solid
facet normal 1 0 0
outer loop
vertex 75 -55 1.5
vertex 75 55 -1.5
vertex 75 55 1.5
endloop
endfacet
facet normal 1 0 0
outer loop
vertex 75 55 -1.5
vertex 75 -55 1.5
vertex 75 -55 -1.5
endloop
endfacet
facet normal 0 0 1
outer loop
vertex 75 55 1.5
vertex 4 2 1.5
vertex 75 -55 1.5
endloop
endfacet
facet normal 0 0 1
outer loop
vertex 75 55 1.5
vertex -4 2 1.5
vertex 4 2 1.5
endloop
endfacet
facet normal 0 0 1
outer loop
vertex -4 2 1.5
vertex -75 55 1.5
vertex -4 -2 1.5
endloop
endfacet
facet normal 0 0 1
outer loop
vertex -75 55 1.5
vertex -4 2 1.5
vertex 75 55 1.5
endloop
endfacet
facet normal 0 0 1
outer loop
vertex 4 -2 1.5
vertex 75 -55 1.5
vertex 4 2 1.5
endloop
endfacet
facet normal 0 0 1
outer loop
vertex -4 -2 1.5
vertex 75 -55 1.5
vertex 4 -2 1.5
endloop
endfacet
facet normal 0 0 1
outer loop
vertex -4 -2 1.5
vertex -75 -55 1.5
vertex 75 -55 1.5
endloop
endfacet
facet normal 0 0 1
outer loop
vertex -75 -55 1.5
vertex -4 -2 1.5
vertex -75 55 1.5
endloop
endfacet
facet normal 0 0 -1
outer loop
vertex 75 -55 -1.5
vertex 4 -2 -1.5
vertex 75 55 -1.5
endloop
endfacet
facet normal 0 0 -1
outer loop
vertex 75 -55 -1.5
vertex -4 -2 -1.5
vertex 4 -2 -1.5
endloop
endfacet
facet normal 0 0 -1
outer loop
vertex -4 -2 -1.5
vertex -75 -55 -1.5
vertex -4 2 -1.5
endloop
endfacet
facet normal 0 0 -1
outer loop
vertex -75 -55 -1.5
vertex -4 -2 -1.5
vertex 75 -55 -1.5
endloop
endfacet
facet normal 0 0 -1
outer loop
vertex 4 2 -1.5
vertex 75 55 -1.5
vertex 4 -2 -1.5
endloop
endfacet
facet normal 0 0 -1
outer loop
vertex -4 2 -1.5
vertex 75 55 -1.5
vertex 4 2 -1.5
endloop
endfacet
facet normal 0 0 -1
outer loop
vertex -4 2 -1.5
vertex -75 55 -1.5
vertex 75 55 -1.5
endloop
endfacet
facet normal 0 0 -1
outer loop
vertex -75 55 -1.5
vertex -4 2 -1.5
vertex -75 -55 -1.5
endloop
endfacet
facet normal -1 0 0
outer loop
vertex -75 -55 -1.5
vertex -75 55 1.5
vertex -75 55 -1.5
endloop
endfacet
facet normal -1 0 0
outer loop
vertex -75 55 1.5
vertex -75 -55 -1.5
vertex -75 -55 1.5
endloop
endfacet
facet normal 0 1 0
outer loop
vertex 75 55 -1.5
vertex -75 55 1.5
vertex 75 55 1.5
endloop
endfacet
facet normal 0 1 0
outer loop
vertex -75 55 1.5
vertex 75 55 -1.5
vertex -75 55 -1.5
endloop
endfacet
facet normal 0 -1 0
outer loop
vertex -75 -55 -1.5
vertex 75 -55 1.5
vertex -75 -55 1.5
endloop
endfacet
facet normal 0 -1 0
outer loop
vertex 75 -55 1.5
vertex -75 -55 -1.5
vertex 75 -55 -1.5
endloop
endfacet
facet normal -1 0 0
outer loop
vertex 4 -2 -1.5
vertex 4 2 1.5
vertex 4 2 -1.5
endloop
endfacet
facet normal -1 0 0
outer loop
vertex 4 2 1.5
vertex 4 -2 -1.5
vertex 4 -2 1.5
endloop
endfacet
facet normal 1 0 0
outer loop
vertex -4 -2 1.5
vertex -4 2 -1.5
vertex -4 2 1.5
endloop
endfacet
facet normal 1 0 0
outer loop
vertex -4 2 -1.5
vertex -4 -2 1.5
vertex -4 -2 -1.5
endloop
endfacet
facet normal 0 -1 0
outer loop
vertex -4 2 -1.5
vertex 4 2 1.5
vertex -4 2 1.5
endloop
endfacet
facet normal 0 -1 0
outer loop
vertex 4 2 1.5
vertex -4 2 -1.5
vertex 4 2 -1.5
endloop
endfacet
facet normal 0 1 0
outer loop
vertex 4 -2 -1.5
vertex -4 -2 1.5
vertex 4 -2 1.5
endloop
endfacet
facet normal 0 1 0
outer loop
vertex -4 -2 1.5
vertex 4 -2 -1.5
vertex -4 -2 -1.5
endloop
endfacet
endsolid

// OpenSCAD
// ========================================
// a 15 x 11 x 0.3 cm plate with one 0.8 x 0.4 cm slots
// NeuroCAD canonical IR; dimensions are millimetres
// ========================================
$fn = 48;

difference() {
  cube(size=[150, 110, 3], center=true);
  cube(size=[8, 4, 5], center=true);
}
